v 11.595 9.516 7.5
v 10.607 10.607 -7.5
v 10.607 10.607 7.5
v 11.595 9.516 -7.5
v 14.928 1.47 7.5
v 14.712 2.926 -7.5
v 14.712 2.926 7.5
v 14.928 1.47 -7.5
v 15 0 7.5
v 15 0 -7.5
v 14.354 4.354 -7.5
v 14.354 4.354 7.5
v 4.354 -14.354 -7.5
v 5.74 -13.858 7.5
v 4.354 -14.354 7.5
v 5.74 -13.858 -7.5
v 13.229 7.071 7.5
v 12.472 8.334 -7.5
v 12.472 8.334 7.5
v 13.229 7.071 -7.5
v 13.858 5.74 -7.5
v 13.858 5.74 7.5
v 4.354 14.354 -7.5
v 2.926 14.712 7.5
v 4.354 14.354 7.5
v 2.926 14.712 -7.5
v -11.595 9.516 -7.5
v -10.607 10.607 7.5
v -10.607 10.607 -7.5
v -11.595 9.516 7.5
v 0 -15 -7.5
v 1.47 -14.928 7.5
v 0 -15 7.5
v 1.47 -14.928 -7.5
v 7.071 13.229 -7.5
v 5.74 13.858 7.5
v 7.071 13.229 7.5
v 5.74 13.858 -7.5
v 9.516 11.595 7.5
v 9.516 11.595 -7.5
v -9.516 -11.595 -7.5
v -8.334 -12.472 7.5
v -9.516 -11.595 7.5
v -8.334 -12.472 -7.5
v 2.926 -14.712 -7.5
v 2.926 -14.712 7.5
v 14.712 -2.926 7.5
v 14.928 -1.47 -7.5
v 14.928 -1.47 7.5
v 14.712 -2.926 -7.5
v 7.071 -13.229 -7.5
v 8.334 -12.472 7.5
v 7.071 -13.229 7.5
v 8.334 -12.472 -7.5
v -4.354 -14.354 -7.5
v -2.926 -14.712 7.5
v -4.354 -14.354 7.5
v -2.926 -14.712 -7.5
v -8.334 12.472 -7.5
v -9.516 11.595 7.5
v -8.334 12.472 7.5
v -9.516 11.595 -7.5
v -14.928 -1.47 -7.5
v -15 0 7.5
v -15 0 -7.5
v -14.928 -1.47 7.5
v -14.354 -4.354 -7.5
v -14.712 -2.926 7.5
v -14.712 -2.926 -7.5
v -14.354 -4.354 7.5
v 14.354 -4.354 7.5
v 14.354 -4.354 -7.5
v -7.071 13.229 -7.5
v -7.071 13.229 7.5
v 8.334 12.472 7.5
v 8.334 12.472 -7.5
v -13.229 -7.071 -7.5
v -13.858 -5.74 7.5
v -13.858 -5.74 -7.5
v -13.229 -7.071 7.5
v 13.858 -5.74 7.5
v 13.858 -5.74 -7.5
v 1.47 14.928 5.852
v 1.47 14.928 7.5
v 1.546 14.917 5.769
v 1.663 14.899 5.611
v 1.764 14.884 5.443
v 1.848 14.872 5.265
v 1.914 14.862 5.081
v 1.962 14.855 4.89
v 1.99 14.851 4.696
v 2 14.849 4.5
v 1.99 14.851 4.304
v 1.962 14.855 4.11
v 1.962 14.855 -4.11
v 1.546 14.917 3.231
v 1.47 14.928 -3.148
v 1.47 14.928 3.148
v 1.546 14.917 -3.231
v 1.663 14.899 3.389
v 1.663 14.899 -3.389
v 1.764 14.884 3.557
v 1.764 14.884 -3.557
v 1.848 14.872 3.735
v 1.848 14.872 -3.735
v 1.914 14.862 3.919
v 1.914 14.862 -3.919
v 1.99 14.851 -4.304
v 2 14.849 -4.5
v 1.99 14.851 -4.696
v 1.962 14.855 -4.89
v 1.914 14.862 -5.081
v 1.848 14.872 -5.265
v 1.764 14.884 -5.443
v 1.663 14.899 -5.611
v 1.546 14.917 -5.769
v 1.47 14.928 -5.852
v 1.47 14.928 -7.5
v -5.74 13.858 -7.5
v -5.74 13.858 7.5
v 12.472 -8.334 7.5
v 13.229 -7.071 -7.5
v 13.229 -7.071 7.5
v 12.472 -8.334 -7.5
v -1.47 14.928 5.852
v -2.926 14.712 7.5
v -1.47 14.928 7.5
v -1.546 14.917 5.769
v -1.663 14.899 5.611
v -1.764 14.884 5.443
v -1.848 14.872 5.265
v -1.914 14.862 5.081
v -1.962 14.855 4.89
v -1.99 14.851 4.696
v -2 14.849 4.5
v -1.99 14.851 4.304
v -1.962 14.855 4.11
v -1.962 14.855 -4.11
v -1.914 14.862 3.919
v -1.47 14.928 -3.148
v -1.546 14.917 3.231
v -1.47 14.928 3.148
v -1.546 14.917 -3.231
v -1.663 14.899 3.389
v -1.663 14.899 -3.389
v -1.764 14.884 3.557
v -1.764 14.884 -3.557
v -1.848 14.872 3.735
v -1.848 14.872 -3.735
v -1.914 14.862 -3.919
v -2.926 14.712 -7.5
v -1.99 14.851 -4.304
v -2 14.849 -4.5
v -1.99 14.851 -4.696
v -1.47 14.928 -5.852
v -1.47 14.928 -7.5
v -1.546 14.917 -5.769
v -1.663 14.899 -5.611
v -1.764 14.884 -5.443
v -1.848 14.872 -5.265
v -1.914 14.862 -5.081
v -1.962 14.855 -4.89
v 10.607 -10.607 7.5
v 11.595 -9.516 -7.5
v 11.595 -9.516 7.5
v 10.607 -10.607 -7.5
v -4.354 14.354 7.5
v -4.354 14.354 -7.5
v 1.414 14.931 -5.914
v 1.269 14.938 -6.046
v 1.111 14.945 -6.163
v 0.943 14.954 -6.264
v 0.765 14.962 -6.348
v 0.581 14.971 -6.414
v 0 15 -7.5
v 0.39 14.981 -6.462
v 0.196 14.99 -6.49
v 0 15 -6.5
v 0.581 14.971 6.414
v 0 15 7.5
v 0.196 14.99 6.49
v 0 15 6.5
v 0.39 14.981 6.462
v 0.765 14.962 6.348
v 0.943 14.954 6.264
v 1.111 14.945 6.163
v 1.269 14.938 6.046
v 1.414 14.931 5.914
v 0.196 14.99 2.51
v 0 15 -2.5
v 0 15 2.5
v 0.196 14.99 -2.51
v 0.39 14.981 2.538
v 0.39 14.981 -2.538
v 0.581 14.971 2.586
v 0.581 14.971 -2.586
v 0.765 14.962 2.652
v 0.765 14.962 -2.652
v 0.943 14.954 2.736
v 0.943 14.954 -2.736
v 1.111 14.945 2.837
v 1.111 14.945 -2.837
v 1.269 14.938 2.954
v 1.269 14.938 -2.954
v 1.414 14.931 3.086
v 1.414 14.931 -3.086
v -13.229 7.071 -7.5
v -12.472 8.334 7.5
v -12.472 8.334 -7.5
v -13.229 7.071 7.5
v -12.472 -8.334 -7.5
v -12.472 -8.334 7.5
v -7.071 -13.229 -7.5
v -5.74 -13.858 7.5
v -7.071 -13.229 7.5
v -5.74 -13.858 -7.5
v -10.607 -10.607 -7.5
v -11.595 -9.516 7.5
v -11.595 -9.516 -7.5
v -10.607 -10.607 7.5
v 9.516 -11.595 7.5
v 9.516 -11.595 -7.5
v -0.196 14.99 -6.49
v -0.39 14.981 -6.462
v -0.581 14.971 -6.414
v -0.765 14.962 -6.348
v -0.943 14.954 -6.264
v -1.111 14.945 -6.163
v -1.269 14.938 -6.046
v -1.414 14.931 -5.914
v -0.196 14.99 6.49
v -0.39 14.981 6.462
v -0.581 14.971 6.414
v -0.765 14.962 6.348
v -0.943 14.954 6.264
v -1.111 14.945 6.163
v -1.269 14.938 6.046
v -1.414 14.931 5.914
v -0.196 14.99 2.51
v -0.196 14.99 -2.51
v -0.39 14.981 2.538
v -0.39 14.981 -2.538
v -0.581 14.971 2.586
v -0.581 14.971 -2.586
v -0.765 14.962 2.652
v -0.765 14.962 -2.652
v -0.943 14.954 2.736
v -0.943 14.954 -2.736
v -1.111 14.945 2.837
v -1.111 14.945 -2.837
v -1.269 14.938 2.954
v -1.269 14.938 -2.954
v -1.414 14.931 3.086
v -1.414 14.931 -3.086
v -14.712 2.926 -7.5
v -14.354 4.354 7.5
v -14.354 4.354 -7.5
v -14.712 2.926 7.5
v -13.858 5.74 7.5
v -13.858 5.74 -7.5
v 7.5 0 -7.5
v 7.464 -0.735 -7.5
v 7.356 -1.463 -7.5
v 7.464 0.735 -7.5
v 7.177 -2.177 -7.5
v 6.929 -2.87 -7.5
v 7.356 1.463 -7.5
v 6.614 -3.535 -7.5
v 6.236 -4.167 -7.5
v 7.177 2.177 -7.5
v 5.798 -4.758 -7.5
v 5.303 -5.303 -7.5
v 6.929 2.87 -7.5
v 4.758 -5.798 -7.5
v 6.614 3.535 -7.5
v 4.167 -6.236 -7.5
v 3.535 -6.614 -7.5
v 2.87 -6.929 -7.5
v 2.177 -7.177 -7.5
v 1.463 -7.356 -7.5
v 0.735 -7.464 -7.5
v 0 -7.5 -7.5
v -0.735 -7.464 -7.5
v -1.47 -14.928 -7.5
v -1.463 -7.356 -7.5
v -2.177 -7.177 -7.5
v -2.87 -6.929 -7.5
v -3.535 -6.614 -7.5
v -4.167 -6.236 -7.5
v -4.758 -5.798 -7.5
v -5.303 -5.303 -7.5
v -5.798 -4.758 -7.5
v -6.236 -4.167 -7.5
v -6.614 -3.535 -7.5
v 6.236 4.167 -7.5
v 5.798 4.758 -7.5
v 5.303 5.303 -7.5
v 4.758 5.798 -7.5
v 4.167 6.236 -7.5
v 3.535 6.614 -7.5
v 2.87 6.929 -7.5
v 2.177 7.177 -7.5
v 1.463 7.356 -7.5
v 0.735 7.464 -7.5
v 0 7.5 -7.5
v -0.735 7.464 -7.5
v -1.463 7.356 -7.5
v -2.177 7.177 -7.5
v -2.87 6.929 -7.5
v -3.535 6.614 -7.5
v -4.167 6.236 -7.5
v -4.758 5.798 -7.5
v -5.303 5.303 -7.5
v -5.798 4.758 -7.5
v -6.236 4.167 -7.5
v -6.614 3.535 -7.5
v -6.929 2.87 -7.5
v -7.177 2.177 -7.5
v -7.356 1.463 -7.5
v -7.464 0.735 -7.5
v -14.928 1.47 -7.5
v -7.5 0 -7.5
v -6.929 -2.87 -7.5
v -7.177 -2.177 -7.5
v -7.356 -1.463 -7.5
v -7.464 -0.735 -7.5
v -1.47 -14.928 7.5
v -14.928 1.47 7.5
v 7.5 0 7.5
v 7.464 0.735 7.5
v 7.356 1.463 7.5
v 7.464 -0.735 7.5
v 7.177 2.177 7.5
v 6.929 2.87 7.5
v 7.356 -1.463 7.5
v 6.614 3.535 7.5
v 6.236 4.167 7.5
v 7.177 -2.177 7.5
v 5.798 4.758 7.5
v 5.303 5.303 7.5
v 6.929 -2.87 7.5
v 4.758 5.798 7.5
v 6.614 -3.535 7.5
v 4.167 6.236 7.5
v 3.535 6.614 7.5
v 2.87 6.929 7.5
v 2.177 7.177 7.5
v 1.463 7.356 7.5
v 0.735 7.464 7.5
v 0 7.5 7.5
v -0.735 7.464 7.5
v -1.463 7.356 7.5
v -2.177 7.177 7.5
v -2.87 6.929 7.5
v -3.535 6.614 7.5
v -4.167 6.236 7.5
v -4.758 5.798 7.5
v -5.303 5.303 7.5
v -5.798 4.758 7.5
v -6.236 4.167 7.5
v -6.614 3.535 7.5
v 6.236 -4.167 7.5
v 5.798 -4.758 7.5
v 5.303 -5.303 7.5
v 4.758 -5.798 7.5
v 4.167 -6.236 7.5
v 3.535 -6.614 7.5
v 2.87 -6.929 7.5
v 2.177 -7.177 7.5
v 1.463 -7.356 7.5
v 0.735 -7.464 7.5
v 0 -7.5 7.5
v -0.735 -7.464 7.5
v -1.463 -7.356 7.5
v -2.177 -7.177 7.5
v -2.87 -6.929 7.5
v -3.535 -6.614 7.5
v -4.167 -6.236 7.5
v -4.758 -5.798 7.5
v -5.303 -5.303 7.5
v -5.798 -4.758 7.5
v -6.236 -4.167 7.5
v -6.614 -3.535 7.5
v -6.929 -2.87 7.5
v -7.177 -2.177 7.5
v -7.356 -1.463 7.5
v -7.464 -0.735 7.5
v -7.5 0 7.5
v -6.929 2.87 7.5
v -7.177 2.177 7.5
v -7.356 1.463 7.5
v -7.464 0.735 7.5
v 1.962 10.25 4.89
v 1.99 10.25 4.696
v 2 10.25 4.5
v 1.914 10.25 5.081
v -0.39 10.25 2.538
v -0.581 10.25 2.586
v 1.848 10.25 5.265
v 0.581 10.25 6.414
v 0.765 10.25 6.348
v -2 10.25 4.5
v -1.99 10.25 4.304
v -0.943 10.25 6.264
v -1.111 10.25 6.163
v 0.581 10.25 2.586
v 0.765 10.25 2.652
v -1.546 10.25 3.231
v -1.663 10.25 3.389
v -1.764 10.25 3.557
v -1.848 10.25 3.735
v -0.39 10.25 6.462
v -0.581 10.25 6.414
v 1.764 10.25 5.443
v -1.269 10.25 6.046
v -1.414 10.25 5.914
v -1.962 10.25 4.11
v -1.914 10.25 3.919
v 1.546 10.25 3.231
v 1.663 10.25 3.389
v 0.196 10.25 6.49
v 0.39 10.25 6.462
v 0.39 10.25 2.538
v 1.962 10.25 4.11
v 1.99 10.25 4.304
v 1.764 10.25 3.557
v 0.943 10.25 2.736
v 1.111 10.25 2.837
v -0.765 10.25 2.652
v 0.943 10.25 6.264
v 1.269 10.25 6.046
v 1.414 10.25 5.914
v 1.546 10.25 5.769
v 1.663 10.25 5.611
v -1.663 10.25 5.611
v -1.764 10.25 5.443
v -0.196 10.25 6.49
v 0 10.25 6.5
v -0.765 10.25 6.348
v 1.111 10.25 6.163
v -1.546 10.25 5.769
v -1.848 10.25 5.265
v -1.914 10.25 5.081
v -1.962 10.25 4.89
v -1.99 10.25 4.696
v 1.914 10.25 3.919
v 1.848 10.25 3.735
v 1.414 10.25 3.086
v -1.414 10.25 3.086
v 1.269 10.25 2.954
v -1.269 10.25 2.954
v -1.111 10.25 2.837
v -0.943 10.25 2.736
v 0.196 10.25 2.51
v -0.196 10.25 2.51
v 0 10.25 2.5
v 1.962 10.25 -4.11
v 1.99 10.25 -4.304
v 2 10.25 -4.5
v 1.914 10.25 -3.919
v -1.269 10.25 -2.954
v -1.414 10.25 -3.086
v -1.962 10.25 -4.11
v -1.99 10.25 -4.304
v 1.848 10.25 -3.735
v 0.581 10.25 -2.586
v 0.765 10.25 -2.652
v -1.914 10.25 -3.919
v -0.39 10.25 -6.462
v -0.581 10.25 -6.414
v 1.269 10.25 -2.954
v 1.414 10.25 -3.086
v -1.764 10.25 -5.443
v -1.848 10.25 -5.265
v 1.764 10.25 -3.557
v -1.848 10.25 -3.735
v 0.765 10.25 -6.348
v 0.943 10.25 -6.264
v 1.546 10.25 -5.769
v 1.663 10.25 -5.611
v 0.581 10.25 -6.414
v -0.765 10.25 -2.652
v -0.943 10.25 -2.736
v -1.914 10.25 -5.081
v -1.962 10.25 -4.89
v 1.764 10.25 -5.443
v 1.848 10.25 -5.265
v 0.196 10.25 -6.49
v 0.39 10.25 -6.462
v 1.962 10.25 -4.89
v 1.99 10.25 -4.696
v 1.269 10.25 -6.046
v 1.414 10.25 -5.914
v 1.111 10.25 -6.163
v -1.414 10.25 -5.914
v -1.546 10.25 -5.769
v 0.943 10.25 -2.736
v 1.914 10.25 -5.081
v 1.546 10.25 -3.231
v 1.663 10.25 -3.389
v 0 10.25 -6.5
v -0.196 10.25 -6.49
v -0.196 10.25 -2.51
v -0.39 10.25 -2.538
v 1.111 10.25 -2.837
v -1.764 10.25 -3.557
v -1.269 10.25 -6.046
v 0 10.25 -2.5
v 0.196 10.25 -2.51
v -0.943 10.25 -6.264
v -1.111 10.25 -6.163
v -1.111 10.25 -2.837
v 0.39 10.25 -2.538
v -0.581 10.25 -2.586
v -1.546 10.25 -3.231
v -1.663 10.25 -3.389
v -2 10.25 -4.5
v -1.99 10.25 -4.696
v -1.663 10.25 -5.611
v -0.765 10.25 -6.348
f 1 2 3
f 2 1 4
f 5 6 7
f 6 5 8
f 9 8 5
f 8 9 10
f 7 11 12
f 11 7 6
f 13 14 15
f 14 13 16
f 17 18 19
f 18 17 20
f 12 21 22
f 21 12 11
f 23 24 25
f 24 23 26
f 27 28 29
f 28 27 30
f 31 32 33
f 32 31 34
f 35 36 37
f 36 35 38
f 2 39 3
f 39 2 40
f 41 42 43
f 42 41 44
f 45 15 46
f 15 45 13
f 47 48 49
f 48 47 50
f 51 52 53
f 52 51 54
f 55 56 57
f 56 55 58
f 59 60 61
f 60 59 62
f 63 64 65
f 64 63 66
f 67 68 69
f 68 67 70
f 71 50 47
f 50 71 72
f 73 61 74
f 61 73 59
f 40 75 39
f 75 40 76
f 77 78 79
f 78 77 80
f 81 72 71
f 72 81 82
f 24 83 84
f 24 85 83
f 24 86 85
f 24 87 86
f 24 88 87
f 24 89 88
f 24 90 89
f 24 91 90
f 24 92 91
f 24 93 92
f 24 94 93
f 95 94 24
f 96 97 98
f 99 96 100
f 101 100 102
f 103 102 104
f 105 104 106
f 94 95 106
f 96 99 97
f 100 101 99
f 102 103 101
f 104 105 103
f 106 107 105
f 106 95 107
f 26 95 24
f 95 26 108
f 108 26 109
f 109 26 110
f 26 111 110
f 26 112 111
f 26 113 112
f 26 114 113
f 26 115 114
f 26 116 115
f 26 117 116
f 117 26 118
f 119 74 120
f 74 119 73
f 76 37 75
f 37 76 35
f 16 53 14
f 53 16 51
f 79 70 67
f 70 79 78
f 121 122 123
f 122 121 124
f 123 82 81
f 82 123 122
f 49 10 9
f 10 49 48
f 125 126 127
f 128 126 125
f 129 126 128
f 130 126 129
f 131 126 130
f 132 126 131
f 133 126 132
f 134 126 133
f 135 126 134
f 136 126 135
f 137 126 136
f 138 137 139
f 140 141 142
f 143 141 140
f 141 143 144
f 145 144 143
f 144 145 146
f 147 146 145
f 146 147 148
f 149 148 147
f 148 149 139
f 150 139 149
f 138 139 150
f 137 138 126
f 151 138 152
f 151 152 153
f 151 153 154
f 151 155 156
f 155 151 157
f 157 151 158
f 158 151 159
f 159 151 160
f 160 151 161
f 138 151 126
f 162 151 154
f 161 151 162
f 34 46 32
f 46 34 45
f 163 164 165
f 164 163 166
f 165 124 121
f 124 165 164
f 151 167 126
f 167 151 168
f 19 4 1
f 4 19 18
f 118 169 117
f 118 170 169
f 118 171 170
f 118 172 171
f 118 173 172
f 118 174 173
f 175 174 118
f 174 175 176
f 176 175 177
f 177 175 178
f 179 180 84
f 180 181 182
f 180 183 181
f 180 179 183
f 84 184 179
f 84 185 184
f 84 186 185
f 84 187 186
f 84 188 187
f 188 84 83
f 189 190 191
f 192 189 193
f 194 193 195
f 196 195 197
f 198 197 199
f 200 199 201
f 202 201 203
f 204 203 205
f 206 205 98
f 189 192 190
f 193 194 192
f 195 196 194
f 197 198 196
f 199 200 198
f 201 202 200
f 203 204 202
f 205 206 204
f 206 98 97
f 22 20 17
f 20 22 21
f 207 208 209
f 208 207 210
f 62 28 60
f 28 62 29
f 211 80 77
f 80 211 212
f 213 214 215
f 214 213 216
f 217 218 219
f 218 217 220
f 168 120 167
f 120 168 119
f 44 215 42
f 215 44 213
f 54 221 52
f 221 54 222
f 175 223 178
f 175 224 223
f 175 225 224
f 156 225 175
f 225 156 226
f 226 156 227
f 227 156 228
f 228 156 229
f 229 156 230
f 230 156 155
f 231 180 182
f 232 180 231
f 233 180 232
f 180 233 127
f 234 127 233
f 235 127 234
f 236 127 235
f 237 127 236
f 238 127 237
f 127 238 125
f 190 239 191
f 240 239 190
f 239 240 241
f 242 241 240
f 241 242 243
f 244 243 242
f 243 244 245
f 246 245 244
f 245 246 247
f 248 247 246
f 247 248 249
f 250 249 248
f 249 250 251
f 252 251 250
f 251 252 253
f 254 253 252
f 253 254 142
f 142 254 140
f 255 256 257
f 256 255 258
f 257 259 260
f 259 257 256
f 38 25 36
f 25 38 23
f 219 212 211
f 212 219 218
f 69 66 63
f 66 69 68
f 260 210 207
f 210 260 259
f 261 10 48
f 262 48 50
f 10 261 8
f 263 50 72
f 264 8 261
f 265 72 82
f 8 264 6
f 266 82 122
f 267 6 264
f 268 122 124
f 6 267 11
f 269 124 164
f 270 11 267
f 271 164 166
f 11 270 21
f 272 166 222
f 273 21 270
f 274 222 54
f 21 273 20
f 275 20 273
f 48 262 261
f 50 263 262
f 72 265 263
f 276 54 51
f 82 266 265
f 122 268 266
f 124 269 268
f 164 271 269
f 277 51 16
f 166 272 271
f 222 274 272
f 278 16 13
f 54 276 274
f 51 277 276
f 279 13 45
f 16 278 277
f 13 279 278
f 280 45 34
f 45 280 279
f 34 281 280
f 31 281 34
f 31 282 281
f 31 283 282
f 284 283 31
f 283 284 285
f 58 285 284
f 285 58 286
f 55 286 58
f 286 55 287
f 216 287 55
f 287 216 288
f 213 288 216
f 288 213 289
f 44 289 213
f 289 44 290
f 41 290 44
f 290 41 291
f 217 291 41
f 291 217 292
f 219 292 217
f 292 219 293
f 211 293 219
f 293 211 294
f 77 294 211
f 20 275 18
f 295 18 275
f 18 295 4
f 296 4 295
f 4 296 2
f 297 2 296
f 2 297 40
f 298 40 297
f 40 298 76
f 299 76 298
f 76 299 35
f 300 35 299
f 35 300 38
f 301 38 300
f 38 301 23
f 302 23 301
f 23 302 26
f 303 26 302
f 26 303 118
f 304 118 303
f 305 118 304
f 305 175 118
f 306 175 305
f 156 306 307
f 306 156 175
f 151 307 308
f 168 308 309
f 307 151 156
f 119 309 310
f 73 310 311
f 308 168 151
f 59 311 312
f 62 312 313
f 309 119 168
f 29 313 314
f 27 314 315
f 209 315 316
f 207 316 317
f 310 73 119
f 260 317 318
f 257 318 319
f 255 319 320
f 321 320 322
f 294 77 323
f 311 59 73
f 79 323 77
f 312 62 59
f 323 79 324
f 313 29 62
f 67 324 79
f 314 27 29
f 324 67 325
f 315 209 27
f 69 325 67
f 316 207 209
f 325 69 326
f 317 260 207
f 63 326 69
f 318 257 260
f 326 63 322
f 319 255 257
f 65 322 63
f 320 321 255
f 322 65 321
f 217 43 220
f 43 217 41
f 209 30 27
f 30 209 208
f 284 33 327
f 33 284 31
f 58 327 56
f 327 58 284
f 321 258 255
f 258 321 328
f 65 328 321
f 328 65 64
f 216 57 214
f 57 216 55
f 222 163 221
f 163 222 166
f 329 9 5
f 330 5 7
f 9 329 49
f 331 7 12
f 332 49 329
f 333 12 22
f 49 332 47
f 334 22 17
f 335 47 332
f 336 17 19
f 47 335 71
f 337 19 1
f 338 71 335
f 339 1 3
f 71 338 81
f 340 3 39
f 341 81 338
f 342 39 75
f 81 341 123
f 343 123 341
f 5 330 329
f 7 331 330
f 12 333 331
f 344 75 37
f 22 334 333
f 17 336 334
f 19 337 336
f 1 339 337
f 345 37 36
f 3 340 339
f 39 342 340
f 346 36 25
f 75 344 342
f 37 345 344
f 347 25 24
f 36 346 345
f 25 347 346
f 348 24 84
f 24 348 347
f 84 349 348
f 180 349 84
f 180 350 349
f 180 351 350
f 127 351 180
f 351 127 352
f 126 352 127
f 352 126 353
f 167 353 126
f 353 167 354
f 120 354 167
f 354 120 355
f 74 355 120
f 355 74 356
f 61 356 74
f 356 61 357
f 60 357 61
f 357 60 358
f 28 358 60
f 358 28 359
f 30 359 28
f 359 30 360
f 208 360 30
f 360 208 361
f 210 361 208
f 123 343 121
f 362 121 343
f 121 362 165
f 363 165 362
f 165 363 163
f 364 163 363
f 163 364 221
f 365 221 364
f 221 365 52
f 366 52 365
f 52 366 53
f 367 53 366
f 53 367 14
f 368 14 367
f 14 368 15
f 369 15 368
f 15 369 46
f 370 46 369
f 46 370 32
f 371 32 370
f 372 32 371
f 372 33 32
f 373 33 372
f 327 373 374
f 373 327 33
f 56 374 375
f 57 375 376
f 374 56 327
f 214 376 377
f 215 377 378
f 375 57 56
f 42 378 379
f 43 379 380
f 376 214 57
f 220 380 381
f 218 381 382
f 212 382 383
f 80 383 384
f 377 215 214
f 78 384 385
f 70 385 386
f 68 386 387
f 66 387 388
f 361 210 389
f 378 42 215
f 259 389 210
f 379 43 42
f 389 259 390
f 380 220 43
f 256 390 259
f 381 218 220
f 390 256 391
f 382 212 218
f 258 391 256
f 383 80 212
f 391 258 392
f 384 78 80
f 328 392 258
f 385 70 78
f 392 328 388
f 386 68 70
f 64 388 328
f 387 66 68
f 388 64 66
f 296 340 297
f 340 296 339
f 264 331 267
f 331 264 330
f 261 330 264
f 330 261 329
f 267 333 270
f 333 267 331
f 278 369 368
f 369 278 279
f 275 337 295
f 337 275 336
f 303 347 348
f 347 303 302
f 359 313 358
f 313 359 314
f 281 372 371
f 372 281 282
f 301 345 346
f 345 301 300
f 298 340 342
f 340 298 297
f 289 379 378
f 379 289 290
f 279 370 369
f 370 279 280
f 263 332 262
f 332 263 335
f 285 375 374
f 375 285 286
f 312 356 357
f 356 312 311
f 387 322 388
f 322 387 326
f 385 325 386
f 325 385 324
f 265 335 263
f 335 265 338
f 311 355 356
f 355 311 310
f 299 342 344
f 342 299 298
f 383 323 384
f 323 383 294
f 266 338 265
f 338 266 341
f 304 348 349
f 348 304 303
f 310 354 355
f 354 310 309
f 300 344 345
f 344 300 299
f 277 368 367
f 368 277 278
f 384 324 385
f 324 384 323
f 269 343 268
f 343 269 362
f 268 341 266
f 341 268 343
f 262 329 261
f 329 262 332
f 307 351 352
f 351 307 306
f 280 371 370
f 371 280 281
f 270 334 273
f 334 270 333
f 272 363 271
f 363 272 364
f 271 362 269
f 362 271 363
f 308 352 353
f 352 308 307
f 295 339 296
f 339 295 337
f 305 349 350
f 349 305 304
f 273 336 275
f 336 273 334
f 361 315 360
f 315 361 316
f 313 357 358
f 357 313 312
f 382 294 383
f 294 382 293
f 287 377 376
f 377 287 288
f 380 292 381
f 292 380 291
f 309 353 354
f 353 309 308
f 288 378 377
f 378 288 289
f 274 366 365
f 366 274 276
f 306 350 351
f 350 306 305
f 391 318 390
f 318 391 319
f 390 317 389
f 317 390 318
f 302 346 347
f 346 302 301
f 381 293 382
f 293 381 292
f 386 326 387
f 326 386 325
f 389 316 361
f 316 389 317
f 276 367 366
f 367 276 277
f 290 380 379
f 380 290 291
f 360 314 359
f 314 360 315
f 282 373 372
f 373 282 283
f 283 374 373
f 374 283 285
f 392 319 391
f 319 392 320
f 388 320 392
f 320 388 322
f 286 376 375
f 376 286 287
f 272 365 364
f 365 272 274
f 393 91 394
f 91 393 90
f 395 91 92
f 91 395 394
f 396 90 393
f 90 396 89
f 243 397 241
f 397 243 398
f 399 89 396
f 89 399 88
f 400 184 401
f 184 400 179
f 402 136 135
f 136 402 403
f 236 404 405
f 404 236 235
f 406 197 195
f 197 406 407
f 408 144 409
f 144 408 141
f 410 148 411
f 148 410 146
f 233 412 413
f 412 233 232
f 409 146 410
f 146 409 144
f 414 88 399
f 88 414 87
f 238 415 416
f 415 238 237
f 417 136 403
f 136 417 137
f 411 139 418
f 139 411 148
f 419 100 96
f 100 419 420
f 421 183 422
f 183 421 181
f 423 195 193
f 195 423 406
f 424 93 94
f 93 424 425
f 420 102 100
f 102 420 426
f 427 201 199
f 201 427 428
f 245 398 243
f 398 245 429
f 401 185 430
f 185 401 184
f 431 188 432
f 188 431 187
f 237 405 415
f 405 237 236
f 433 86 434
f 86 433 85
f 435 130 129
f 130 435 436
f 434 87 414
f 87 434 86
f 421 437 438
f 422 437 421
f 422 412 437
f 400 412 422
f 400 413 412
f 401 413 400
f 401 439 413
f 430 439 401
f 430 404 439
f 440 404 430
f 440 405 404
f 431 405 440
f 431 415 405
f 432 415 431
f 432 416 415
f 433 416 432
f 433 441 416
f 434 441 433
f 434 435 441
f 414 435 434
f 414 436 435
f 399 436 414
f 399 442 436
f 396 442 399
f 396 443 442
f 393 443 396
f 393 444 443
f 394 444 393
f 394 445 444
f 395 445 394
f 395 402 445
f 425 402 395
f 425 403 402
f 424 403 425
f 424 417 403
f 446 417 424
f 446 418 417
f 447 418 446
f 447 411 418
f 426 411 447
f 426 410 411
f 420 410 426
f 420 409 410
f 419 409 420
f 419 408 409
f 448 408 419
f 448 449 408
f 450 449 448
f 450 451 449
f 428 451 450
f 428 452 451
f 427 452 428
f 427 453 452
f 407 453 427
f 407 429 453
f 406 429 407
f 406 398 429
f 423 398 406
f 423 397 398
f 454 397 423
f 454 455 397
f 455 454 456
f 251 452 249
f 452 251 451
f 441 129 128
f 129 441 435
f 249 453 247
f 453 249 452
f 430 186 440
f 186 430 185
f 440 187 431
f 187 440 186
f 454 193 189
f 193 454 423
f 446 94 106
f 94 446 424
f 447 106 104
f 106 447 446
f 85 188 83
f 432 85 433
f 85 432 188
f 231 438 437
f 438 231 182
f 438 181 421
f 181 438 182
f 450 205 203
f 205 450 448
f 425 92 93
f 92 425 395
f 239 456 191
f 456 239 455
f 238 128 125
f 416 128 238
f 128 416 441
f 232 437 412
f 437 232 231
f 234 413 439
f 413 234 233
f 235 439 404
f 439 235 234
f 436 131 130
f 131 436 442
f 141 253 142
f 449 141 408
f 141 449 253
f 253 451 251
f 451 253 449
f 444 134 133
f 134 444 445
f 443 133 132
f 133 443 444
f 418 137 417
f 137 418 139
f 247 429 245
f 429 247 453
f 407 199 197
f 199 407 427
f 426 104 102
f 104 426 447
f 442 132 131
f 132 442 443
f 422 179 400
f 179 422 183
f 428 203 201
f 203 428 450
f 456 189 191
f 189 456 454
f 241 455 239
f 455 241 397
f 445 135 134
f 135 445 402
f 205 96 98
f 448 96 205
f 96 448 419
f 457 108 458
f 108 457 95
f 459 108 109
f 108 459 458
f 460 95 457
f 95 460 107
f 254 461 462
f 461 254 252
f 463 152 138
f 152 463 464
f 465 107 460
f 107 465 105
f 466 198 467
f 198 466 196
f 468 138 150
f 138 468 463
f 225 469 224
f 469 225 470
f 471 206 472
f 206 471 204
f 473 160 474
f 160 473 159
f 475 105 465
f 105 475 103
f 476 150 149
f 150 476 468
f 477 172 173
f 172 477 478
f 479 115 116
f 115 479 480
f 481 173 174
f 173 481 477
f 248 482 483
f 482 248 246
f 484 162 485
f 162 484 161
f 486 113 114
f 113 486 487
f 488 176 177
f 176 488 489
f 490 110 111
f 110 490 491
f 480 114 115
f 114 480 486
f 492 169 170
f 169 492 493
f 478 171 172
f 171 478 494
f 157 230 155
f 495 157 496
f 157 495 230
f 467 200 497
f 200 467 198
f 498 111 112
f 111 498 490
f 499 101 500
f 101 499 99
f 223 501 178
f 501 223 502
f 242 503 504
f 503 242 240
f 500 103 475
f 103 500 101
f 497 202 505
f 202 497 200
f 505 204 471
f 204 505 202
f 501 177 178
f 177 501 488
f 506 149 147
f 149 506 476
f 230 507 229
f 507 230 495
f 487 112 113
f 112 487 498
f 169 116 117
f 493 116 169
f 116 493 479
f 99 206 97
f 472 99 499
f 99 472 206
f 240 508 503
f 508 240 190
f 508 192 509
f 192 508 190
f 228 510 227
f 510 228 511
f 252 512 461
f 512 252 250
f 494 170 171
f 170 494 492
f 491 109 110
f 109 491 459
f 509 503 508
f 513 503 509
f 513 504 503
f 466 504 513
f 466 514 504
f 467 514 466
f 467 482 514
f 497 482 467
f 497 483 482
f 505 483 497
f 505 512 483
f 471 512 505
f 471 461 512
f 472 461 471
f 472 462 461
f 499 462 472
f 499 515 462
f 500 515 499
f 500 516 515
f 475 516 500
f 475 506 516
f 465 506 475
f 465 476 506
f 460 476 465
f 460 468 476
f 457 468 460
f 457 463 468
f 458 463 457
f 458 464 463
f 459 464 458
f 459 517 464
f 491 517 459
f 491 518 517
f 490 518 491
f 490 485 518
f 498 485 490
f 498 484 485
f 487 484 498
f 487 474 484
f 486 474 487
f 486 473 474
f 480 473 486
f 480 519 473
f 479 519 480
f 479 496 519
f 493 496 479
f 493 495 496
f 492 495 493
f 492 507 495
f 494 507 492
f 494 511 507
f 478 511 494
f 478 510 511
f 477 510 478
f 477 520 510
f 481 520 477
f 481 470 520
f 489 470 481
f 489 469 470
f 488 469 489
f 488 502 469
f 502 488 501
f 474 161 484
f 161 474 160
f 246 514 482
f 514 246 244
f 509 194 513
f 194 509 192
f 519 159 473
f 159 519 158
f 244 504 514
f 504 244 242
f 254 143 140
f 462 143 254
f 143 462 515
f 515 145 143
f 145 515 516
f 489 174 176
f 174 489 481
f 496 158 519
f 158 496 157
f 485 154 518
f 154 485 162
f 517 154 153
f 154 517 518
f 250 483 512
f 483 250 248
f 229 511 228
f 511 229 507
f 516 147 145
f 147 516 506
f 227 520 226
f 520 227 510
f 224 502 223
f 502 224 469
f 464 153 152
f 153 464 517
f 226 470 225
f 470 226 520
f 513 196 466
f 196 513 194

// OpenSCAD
// COBRA Vertebra - C2 V1
// Height: 15.0mm, OD: 30.0mm

$fn = 64;

difference() {
    // Outer cylinder
    cylinder(h=15.0, d=30.0, center=true);
    
    // Inner channel
    cylinder(h=17.0, d=15.0, center=true);

    // Pivot holes
    translate([0, 15.0, 4.5])
    rotate([90, 0, 0])
    cylinder(h=9.5, d=4, center=true);
    
    translate([0, 15.0, -4.5])
    rotate([90, 0, 0])
    cylinder(h=9.5, d=4, center=true);
}
